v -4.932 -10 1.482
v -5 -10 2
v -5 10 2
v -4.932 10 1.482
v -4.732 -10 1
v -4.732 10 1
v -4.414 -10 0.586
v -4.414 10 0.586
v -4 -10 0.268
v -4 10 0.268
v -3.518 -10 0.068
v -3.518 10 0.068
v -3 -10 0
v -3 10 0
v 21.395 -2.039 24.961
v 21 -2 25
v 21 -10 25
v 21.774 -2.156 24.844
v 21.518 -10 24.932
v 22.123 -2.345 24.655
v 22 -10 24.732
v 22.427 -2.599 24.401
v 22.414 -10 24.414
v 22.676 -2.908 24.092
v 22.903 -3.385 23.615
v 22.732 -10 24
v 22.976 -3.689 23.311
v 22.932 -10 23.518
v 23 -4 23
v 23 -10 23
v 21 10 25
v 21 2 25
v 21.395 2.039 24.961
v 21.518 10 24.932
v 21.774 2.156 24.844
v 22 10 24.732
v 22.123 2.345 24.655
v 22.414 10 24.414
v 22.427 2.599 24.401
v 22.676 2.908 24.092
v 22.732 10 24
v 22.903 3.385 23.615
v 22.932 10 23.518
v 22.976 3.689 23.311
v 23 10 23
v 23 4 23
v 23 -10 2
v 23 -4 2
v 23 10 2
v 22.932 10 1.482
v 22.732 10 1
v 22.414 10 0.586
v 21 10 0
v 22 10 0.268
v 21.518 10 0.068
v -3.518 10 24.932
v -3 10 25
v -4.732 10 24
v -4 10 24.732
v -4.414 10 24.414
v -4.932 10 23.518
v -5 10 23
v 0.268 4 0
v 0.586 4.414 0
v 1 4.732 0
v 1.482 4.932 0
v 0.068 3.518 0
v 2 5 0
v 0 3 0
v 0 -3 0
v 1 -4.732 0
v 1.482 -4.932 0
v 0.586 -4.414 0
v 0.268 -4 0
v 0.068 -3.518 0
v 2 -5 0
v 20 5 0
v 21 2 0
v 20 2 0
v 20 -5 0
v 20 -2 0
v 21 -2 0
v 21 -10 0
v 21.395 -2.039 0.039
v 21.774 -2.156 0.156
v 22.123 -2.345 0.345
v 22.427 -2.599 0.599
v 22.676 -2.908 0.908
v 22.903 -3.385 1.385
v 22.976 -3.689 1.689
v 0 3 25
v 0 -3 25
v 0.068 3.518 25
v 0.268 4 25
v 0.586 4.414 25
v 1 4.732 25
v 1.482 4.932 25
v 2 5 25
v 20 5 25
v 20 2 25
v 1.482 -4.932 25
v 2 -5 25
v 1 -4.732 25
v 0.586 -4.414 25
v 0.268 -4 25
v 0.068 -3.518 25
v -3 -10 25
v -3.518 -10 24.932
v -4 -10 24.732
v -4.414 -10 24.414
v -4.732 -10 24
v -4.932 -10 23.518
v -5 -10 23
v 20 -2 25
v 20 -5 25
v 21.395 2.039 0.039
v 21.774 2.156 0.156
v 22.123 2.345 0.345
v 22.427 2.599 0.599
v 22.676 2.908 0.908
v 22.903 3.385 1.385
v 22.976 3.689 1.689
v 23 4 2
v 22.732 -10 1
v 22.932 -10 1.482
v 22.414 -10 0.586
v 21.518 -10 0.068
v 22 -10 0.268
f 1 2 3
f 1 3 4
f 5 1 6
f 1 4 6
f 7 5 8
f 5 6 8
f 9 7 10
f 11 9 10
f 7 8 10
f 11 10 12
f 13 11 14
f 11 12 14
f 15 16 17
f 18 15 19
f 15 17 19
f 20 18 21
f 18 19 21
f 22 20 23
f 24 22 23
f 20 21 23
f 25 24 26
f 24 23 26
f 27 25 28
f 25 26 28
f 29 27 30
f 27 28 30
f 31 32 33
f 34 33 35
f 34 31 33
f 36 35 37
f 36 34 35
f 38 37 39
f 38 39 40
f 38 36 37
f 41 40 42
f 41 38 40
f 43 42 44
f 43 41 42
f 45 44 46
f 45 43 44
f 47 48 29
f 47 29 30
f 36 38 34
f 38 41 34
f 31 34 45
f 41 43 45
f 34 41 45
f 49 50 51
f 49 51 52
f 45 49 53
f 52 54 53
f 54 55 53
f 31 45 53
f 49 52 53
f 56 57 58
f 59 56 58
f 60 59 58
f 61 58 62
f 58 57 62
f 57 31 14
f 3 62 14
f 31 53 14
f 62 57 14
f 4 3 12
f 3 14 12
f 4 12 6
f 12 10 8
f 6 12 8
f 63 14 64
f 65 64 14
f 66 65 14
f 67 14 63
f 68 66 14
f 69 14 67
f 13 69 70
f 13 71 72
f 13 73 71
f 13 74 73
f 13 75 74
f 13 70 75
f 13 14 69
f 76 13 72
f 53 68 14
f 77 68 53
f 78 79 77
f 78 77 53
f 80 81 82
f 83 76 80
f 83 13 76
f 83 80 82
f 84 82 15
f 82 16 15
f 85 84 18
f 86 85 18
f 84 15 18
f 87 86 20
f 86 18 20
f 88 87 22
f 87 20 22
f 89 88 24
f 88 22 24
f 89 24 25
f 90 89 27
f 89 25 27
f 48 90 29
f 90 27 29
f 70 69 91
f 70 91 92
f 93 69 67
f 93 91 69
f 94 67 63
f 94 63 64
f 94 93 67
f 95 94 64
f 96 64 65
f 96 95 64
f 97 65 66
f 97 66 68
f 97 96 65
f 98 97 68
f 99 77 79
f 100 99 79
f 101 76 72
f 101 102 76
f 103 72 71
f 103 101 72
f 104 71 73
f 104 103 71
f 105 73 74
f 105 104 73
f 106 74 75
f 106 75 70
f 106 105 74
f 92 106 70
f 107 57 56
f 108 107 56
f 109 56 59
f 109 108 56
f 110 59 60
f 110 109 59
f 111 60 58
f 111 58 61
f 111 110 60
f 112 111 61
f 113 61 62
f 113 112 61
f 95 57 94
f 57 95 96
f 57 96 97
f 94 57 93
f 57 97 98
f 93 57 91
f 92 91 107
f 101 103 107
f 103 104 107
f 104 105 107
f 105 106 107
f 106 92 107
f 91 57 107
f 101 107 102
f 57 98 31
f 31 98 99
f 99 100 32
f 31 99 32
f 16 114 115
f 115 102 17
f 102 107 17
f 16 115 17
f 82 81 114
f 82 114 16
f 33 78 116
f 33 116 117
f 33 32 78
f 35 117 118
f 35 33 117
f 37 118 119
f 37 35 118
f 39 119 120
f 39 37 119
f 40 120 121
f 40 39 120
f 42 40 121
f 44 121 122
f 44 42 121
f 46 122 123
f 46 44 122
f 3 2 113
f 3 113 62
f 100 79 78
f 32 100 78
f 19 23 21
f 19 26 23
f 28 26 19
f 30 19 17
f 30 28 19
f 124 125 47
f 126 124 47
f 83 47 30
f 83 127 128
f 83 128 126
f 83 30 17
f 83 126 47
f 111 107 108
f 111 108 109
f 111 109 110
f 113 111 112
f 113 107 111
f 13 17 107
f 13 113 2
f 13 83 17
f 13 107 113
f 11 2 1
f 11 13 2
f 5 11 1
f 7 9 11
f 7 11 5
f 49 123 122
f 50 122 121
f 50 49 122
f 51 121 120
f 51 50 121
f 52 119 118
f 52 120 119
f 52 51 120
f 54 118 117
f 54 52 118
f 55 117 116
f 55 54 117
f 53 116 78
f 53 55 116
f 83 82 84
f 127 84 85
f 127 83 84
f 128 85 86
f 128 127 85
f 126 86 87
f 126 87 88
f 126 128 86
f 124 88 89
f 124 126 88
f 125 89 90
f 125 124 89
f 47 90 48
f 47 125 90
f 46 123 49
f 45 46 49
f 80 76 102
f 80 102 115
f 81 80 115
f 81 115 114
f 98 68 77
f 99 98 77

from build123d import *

# Parameters (mm, degrees)
F1_DEPTH = 25
F3_R     = 2


with BuildPart() as f1:
    # F0 (on Top) → F1 (new body)
    with BuildSketch(Plane.XY):
        Polygon((20, 2), (23, 2), (23, 10), (-5, 10), (-5, 0), (0, 0), (0, 5), (20, 5), align=None)
    extrude(amount=F1_DEPTH)

    # F2: F1 across plane


with BuildPart() as f1_1:
    add(f1.part)
    add(f1.part.mirror(Plane.XZ))

    # F3
    f3_edges = [f1_1.edges().sort_by_distance(p)[0] for p in [
        (0, 5, 12.5),
        (0, -5, 12.5),
        (23, 2, 12.5),
        (23, -2, 12.5),
        (-5, 0, 25),
        (-5, 0, 0),
        (23, 6, 25),
        (23, -6, 25),
        (23, -6, 0),
        (23, 6, 0),
    ]]
    fillet(f3_edges, radius=F3_R)


solid = f1_1.part
